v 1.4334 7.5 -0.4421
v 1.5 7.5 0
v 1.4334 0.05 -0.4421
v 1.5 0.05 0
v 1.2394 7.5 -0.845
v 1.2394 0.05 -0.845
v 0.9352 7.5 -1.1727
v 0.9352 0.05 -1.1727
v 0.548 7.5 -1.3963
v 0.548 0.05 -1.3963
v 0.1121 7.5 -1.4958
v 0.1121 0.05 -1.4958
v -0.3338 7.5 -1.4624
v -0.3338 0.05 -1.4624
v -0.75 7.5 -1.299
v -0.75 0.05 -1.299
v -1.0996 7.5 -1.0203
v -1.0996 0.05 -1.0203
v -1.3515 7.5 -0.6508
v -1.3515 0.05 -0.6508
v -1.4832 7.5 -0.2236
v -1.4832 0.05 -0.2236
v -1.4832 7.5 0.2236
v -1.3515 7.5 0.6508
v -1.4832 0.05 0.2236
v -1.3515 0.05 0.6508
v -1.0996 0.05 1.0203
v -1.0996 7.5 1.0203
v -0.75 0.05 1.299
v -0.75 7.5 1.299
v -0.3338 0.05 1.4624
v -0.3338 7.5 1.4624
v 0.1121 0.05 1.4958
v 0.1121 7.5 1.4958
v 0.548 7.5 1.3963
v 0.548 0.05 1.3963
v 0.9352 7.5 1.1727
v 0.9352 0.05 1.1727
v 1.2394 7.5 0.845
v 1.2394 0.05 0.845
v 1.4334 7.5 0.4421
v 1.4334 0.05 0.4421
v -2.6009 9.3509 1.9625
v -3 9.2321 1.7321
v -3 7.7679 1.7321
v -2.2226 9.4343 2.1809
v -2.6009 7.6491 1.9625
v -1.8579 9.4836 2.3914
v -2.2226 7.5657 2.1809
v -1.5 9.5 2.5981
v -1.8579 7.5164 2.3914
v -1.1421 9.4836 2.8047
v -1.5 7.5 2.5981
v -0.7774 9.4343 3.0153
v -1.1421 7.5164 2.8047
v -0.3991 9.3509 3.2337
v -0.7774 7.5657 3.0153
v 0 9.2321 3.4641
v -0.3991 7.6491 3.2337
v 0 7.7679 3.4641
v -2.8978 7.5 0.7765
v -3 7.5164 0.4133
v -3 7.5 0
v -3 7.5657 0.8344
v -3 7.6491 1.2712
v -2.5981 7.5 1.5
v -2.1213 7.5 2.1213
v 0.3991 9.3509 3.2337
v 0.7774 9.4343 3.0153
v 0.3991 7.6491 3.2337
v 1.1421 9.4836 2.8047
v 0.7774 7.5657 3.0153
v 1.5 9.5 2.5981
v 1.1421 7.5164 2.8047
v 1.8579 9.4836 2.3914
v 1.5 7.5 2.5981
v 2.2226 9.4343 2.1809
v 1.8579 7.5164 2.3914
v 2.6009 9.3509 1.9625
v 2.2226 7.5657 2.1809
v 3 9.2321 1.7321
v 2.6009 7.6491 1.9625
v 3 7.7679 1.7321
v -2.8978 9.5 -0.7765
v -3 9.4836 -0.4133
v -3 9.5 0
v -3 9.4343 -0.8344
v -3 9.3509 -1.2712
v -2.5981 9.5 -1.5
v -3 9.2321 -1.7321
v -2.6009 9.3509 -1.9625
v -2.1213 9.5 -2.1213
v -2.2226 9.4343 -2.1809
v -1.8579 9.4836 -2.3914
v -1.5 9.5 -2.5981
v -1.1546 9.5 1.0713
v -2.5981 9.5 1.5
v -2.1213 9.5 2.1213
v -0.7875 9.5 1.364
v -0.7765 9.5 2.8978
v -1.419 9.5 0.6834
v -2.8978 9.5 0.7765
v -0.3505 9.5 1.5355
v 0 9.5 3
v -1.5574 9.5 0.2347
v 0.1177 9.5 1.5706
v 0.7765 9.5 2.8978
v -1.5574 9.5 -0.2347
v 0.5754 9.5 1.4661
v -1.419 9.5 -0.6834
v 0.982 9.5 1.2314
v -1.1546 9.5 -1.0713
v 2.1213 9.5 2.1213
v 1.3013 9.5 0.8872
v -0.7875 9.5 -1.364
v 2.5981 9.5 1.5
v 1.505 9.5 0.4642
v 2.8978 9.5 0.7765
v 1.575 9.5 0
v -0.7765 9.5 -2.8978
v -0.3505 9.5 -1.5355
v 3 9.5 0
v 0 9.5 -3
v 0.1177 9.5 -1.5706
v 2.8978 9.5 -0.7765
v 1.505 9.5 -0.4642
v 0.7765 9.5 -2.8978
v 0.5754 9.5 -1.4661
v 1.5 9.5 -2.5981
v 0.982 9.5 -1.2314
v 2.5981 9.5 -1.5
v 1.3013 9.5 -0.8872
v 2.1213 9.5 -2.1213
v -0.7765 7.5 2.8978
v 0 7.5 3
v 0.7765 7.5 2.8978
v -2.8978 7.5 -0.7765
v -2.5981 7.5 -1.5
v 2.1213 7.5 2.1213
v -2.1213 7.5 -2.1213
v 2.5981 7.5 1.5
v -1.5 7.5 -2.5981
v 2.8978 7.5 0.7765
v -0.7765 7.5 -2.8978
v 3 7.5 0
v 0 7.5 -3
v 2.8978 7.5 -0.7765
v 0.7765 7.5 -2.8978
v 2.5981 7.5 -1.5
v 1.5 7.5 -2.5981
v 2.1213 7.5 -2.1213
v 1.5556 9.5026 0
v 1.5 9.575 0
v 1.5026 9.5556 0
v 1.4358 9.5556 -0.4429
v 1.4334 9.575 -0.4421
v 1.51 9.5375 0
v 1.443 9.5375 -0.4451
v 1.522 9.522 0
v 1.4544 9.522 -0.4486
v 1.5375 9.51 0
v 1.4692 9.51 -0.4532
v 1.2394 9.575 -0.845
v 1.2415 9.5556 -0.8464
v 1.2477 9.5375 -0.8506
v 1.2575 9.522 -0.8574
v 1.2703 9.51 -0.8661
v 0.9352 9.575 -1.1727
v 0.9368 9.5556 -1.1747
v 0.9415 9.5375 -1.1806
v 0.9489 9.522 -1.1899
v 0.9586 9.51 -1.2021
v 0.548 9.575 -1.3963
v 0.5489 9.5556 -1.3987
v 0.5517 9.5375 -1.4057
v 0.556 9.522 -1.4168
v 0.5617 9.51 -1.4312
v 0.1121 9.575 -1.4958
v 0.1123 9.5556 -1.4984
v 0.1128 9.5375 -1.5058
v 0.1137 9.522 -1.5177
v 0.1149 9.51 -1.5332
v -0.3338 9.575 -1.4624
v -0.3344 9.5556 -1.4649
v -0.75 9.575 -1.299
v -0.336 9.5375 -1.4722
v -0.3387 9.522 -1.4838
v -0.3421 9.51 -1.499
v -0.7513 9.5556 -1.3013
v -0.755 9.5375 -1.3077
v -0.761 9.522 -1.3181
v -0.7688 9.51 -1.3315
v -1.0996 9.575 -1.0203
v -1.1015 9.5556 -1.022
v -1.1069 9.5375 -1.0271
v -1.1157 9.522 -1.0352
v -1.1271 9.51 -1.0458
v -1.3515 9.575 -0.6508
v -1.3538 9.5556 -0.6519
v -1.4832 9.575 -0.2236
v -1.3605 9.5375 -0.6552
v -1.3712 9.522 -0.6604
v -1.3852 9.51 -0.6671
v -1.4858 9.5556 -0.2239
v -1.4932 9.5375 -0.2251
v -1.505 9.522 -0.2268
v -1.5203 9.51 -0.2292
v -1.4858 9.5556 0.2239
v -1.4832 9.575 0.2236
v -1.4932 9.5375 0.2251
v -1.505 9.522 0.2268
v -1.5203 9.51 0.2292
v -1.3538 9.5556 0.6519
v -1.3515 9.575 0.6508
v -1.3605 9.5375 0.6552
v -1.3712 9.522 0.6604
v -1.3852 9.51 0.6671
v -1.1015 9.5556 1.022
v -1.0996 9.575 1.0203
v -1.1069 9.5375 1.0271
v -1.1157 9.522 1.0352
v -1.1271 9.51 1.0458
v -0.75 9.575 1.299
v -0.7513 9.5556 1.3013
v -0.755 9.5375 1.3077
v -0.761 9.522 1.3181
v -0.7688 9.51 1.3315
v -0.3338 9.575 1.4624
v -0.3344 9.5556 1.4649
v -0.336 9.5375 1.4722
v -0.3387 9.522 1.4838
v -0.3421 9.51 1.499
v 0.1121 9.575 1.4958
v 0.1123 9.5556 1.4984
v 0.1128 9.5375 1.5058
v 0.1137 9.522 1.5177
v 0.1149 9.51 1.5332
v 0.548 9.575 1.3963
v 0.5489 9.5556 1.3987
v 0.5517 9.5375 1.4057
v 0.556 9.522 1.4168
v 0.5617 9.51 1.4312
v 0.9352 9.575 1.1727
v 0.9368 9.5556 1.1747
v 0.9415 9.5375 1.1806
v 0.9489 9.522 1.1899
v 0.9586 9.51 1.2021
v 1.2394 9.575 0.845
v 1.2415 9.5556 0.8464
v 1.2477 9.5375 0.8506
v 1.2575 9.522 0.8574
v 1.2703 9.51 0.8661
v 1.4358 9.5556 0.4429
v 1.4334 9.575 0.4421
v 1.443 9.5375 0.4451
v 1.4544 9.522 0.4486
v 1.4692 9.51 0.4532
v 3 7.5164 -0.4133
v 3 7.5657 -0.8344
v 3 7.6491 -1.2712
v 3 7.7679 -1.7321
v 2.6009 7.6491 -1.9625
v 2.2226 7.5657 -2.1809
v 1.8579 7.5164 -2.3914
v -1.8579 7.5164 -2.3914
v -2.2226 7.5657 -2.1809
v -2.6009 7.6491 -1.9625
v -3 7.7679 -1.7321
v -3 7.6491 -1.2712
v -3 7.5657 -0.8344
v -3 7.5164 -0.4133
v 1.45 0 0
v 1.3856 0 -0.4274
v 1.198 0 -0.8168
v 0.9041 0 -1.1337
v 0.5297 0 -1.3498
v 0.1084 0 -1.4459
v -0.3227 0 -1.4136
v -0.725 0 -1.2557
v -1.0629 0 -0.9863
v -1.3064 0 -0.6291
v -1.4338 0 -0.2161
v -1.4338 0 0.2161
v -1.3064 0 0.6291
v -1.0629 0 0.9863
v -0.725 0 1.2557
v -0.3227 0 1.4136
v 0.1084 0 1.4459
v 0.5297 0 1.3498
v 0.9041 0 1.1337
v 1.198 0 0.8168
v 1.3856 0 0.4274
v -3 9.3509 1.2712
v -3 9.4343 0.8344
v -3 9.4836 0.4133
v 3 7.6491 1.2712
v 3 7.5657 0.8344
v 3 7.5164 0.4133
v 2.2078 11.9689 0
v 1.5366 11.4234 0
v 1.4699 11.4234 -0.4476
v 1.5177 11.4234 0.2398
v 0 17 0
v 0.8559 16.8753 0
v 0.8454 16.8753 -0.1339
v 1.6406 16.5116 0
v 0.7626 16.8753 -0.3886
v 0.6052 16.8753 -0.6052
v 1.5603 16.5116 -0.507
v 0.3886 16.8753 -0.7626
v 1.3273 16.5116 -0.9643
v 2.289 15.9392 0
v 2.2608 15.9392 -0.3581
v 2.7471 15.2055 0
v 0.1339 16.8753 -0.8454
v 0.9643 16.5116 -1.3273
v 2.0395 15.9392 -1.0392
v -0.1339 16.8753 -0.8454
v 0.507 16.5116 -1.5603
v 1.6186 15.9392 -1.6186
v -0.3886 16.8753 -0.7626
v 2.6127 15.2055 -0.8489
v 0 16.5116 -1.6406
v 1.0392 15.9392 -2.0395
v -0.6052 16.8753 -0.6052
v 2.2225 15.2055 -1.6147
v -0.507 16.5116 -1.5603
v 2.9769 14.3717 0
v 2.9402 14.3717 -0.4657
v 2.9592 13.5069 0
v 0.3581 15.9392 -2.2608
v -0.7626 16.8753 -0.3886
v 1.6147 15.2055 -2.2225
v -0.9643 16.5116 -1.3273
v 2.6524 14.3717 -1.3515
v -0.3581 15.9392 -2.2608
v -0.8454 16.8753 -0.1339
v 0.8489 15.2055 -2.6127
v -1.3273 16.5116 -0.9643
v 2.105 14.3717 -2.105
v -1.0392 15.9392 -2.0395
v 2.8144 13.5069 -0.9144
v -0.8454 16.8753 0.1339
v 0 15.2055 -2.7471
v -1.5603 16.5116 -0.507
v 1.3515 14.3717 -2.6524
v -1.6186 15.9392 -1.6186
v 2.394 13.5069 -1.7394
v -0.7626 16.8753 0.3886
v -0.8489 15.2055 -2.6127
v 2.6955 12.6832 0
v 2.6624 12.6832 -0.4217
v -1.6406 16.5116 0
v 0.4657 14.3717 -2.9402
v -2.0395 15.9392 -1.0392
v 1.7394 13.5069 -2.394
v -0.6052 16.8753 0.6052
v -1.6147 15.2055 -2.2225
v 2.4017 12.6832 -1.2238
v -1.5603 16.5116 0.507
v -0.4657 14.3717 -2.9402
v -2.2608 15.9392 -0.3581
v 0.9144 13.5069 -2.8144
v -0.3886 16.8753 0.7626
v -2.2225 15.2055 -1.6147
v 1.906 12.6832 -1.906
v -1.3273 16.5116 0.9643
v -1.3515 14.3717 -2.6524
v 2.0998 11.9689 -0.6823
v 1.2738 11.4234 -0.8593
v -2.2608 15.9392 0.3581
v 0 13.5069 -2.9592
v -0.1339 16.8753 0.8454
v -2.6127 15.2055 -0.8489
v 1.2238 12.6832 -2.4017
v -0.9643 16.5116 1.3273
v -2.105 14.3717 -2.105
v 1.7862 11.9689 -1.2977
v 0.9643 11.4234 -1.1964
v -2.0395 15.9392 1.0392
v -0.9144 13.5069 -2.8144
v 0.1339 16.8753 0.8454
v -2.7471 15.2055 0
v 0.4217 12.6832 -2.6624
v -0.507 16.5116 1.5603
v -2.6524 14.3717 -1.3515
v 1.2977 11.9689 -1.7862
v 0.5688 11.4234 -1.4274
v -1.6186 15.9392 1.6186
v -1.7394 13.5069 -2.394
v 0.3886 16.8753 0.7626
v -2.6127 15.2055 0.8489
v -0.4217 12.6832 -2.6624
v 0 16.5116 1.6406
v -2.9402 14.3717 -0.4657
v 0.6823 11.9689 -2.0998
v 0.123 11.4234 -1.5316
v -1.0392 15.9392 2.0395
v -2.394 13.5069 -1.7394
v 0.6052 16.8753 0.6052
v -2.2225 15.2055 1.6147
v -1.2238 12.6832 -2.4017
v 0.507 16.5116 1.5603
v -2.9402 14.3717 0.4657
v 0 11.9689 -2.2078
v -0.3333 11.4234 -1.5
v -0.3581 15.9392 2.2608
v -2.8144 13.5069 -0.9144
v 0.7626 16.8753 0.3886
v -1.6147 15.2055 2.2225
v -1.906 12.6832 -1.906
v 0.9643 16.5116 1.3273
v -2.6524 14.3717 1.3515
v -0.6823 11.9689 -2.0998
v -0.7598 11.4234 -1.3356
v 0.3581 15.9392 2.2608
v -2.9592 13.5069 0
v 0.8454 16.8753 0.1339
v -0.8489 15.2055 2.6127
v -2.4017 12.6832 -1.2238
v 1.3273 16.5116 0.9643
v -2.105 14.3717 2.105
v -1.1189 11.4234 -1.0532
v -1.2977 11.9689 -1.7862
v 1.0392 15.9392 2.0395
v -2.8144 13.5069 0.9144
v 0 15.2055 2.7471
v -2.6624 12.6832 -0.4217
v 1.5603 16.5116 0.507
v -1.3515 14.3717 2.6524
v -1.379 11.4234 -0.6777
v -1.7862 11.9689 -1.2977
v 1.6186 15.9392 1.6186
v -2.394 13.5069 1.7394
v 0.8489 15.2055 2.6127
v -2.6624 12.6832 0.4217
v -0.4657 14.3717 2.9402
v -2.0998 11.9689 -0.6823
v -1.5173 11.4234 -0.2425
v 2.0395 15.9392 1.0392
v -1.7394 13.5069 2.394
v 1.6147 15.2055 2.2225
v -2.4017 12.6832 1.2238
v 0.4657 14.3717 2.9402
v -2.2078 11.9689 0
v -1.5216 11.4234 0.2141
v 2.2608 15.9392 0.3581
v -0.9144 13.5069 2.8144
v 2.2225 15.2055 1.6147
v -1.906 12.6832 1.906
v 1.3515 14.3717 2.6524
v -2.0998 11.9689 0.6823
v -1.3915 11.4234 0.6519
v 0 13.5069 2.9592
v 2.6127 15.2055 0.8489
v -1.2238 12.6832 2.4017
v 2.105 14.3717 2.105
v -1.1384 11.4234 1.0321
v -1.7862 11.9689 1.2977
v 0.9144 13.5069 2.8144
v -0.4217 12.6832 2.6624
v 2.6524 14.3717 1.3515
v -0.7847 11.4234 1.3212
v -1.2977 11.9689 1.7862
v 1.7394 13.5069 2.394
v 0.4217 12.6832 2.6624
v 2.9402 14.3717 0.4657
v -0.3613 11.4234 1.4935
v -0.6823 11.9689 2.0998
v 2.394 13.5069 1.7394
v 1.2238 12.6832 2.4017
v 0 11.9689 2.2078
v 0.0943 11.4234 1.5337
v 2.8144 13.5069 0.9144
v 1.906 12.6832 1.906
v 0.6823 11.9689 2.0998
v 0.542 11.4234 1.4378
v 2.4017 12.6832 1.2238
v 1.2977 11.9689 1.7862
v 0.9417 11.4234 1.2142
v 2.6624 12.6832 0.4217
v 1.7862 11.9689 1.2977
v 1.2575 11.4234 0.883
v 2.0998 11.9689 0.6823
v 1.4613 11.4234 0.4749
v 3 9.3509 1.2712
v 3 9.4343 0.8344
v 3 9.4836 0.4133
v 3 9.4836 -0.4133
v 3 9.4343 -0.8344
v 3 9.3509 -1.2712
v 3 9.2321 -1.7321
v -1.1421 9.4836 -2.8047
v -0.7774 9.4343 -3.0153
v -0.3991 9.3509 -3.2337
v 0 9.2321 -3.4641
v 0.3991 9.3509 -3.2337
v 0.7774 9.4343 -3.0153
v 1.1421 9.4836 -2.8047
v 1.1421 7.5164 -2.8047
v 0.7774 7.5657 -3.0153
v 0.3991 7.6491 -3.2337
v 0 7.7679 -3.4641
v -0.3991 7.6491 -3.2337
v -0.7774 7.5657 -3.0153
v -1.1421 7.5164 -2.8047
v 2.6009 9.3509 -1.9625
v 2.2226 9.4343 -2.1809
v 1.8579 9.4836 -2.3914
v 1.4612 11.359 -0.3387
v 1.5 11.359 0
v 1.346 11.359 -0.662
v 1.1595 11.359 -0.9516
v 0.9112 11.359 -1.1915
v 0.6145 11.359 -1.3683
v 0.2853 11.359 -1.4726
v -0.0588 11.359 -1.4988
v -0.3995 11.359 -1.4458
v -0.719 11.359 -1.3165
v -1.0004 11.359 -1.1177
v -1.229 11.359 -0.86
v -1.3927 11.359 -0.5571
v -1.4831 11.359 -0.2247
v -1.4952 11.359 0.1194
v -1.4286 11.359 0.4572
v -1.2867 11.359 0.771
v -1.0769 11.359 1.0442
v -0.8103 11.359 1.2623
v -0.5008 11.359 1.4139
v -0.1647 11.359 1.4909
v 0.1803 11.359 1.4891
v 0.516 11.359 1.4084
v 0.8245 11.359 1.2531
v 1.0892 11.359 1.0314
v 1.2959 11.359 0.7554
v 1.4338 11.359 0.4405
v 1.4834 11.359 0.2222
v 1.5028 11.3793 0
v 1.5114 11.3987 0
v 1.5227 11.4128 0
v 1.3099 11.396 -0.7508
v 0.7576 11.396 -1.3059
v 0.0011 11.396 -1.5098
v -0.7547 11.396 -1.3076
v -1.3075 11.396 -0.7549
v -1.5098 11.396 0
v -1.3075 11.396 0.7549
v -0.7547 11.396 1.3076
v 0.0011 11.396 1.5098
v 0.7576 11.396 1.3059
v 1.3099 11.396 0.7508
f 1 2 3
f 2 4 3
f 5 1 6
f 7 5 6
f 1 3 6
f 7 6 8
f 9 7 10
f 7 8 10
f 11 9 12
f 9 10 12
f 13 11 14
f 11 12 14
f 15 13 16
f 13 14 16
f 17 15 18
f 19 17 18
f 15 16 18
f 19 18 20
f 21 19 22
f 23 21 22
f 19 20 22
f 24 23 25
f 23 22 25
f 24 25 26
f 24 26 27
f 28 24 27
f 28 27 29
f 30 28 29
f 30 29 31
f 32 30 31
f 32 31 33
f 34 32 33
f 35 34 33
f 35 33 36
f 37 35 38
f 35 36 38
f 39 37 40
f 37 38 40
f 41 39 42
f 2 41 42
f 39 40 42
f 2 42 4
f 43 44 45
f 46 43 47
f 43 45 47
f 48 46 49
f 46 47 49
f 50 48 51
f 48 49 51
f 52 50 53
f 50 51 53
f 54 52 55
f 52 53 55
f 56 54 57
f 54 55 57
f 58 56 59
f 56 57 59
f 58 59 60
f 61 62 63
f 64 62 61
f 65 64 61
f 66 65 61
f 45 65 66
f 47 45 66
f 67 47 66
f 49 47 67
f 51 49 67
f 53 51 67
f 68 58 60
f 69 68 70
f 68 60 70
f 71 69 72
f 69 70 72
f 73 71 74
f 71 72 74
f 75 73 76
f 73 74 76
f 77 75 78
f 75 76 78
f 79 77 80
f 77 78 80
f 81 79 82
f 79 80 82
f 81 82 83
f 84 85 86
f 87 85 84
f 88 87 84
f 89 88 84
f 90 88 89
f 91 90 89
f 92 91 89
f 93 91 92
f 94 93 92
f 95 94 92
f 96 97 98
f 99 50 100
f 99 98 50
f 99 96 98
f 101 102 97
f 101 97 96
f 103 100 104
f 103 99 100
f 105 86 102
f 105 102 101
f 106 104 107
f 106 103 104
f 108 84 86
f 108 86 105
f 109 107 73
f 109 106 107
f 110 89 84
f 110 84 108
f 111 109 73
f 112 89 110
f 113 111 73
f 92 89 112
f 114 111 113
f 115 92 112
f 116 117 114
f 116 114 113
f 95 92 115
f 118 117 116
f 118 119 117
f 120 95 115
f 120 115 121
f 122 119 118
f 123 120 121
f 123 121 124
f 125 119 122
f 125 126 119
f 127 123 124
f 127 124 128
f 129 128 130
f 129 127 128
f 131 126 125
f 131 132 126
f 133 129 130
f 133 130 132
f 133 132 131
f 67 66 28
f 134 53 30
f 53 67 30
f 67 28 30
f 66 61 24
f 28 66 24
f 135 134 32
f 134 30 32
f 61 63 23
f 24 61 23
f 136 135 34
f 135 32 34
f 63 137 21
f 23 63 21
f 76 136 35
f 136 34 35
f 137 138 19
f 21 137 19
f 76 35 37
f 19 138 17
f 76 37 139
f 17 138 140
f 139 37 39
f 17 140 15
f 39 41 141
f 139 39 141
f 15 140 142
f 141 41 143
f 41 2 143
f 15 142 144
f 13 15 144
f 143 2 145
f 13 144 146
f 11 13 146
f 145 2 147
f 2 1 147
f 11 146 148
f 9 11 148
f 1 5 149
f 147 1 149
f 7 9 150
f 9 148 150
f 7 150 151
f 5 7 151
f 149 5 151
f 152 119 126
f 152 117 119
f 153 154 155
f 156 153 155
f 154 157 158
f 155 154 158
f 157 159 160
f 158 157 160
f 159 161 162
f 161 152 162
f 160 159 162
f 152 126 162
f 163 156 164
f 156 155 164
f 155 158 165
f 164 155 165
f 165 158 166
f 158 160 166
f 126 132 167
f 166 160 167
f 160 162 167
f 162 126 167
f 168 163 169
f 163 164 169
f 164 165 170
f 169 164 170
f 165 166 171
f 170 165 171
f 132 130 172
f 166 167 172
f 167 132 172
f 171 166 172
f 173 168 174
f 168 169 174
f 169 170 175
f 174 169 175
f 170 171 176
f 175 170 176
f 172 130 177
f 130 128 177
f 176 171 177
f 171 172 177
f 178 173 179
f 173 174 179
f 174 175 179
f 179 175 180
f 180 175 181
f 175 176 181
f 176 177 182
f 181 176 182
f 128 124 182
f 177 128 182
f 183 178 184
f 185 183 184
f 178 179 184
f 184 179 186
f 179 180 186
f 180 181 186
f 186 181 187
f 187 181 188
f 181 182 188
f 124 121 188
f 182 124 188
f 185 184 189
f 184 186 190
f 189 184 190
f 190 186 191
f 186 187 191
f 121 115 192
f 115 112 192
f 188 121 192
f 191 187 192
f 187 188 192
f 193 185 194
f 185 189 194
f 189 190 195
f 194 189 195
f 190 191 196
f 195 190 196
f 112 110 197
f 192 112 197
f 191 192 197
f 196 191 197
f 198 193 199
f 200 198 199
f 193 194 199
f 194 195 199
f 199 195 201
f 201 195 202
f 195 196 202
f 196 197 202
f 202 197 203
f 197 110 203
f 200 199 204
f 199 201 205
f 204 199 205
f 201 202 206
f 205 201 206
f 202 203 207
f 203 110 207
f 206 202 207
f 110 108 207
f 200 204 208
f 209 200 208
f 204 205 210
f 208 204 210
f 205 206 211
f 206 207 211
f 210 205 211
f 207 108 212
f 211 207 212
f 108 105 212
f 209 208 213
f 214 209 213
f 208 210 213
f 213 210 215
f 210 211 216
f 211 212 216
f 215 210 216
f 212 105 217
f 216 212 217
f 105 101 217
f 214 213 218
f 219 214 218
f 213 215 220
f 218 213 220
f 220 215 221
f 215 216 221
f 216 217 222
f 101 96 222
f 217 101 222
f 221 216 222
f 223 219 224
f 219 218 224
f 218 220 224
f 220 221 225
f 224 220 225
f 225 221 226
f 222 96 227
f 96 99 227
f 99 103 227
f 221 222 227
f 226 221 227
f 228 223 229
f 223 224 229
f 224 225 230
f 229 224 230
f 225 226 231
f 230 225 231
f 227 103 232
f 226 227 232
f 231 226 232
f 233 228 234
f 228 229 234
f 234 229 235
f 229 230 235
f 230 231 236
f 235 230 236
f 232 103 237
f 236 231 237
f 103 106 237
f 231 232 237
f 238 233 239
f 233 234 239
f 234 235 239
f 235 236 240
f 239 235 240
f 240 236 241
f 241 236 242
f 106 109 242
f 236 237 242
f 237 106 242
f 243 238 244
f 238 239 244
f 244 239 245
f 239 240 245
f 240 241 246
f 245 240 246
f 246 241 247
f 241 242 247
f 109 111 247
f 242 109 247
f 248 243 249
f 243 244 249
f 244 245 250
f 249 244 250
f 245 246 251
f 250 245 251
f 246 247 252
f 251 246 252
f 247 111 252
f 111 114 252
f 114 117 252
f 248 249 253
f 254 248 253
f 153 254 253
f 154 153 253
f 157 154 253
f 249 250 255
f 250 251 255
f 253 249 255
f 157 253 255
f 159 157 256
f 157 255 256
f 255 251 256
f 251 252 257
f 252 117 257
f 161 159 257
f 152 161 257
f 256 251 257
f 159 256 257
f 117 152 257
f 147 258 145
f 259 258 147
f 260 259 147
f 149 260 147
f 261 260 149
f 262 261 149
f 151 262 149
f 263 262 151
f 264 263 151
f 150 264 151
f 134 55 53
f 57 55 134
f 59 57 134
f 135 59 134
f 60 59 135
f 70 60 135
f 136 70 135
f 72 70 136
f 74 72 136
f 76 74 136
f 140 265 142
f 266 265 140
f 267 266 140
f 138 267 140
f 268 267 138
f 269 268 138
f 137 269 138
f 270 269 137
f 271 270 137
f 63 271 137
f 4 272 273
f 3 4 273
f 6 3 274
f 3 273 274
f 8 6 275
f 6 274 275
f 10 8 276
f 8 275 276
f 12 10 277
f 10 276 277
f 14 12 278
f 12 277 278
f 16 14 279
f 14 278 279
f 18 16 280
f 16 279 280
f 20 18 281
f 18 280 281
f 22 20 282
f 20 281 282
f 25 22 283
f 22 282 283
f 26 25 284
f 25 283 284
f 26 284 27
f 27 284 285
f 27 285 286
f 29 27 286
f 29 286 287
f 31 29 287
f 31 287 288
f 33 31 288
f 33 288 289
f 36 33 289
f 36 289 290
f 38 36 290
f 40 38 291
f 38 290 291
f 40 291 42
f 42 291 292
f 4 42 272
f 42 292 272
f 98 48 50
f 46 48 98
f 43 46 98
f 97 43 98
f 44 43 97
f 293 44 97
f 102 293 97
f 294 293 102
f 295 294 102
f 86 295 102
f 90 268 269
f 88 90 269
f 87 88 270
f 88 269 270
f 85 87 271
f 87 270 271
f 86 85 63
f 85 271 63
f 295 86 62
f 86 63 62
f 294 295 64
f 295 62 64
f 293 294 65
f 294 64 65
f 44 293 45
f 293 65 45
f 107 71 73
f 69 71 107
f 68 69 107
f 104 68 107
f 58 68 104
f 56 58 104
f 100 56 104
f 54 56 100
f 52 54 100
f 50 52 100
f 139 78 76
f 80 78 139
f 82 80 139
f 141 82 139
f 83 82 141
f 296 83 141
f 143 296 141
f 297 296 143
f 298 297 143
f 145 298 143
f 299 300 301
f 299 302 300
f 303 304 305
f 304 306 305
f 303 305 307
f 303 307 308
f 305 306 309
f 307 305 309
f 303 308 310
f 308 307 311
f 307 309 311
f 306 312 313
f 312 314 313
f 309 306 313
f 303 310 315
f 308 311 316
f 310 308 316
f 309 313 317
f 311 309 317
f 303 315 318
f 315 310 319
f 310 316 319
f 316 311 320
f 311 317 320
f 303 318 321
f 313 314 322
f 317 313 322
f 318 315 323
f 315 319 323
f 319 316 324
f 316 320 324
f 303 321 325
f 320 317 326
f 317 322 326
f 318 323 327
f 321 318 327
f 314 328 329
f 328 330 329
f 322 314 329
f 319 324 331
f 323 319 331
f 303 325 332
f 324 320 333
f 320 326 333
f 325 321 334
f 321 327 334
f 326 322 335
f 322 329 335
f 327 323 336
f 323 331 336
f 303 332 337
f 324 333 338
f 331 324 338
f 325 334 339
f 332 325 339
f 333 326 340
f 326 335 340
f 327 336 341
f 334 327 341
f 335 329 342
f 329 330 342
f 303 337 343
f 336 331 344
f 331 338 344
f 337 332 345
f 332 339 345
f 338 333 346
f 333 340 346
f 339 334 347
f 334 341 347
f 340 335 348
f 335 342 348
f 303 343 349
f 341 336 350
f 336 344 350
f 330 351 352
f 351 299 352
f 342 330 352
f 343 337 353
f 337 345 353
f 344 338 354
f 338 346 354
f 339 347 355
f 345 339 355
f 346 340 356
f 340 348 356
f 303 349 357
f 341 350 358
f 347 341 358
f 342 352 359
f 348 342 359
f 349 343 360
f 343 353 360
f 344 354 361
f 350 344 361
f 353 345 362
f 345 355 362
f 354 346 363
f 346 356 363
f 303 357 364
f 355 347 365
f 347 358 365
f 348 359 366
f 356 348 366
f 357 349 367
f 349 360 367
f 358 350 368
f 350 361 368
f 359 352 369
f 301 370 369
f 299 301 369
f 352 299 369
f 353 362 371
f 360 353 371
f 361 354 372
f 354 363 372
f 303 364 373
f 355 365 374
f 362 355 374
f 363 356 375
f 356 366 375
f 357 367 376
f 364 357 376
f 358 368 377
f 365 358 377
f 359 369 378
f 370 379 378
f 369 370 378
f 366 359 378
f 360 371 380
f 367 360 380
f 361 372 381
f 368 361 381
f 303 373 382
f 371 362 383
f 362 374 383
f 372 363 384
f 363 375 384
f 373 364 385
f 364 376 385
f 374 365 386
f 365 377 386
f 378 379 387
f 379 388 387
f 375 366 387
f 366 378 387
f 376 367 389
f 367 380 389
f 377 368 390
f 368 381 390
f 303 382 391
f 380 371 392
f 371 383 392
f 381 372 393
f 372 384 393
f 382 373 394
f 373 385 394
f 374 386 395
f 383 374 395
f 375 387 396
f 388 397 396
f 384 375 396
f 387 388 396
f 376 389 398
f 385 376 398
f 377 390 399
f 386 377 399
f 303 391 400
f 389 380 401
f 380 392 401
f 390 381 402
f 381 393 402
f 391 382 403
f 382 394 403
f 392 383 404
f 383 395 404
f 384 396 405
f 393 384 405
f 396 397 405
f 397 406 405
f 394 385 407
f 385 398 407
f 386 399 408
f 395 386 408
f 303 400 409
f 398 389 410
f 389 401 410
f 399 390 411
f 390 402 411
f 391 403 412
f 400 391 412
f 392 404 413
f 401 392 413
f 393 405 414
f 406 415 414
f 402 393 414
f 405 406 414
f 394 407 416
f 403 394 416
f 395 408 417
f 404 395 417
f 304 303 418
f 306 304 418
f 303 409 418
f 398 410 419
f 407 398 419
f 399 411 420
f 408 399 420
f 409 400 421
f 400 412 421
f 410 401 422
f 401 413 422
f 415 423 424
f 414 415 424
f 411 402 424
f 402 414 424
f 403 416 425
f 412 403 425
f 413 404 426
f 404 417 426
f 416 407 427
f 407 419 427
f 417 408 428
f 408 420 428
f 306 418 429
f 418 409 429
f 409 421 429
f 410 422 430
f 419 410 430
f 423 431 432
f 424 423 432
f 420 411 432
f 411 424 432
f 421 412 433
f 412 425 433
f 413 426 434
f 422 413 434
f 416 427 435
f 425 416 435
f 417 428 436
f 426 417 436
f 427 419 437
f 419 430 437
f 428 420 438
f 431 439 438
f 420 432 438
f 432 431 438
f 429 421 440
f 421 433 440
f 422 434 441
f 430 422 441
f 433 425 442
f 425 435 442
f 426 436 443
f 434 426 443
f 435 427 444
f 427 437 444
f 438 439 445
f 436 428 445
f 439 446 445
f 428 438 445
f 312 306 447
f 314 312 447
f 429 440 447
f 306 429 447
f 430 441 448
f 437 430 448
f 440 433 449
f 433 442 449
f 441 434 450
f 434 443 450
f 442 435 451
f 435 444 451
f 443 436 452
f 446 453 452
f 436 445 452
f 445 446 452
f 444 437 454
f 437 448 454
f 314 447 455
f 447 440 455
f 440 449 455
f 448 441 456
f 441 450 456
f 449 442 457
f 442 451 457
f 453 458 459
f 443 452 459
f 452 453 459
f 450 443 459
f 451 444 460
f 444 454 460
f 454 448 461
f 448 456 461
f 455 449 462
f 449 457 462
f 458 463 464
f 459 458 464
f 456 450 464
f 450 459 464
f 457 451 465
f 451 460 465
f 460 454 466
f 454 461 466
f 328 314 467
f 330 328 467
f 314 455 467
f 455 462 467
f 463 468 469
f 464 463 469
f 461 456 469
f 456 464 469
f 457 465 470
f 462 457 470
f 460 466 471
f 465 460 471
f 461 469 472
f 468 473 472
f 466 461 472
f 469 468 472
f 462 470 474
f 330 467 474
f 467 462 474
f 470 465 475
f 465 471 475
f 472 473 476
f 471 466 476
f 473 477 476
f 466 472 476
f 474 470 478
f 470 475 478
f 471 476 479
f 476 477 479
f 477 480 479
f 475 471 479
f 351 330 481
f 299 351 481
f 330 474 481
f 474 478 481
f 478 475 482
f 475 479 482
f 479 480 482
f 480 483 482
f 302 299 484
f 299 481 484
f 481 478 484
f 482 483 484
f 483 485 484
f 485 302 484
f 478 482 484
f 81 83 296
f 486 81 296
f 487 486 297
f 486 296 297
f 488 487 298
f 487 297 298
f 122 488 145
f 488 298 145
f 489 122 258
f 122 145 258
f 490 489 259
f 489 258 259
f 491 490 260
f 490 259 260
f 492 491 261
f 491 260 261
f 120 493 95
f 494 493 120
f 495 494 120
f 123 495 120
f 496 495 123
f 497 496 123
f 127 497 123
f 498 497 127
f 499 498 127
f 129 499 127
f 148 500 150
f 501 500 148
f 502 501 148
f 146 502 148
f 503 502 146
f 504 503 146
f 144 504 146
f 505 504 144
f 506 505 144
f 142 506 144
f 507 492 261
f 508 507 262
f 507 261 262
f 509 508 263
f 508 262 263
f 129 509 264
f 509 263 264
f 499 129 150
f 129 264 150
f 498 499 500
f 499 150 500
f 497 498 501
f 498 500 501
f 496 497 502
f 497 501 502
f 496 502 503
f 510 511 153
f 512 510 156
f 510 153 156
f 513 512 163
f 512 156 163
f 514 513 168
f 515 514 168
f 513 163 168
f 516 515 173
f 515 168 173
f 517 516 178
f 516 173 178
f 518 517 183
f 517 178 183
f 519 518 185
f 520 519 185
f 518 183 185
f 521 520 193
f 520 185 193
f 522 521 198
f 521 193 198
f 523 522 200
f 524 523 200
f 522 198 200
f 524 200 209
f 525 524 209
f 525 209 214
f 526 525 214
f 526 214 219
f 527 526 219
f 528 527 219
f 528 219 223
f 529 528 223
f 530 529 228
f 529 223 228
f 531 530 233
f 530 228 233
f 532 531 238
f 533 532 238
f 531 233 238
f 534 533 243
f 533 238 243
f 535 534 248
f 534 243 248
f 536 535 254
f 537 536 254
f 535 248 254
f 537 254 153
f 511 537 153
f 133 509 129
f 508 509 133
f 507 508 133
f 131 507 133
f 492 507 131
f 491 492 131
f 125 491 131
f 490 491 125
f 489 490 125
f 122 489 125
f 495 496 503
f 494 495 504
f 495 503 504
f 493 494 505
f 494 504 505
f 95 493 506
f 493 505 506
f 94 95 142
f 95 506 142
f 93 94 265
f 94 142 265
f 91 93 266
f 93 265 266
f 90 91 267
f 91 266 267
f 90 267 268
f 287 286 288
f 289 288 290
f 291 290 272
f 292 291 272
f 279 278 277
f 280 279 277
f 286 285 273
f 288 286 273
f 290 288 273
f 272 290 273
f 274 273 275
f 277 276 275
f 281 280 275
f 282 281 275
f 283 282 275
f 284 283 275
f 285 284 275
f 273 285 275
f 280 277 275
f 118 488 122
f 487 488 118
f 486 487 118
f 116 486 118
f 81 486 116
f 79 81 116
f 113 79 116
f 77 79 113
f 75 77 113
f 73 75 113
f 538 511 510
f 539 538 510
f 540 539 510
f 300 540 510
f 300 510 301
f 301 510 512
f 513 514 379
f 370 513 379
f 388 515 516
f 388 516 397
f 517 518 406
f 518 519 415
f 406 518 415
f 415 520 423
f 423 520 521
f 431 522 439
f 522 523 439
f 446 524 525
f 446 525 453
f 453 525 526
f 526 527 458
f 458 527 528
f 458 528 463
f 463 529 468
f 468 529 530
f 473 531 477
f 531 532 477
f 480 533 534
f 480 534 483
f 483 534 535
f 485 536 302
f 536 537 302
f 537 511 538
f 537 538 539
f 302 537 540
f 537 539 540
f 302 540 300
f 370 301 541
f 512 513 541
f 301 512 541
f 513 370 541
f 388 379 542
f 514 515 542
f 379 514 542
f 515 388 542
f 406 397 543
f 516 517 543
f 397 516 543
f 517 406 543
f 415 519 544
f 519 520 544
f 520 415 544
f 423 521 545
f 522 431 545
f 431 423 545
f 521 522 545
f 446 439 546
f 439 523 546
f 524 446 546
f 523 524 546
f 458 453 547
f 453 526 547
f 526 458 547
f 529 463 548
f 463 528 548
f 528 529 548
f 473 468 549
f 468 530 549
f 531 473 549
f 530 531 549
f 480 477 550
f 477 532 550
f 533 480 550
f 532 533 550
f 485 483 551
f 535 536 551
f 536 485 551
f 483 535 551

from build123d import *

# Parameters (mm, degrees)
CHAMFER1_SIZE       = 0.05
SKETCH4_R           = 1.5
BOSS_EXTRUDE2_DEPTH = 2
SKETCH5_OUTSIDE_W   = 18.79
SKETCH5_OUTSIDE_H   = 19.718
SKETCH5_OUTSIDE_R   = 3
CUT_EXTRUDE1_DEPTH  = 2
CUT_EXTRUDE1_TAPER  = 60
SKETCH6_OUTSIDE_W   = 18.79
SKETCH6_OUTSIDE_H   = 19.718
SKETCH6_OUTSIDE_R   = 3
CUT_EXTRUDE2_DEPTH  = 2
CUT_EXTRUDE2_TAPER  = 60
FILLET1_R           = 0.075


with BuildPart() as part:
    # Sketch1 → Revolve2 (revolve)
    with BuildSketch(Plane.XY):
        with BuildLine():
            Line((0, 0), (0, 11))
            Line((0, 11), (0, 17))
            ThreePointArc((0, 17), (2.897777479, 14.776457135), (1.5, 11.401923789))
            Line((1.5, 11.401923789), (1.5, 0))
            Line((1.5, 0), (0, 0))
        make_face()
    revolve(axis=Axis((0, 0, 0), (0, 1, 0)))

    # Chamfer1
    chamfer1_edges = [part.edges().sort_by_distance(p)[0] for p in [
        (-1.5, 0, 0),
    ]]
    chamfer(chamfer1_edges, length=CHAMFER1_SIZE)

    # Sketch4 → Boss-Extrude2 (add)
    with BuildSketch(Plane(origin=(0, 7.5, 0), x_dir=(1, 0, 0), z_dir=(0, 1, 0))):
        Polygon((0, -3.464101615), (3, -1.732050808), (3, 1.732050808), (0, 3.464101615), (-3, 1.732050808), (-3, -1.732050808), align=None)
        Circle(SKETCH4_R, mode=Mode.SUBTRACT)
    extrude(amount=BOSS_EXTRUDE2_DEPTH)

    # Sketch5 outside → Cut-Extrude1 (cut)
    with BuildSketch(Plane.XZ.offset(-7.5)):
        Rectangle(SKETCH5_OUTSIDE_W, SKETCH5_OUTSIDE_H)
        Circle(SKETCH5_OUTSIDE_R, mode=Mode.SUBTRACT)
    extrude(amount=-CUT_EXTRUDE1_DEPTH, taper=CUT_EXTRUDE1_TAPER, mode=Mode.SUBTRACT)

    # Sketch6 outside → Cut-Extrude2 (cut)
    with BuildSketch(Plane(origin=(0, 9.5, 0), x_dir=(1, 0, 0), z_dir=(0, 1, 0))):
        Rectangle(SKETCH6_OUTSIDE_W, SKETCH6_OUTSIDE_H)
        Circle(SKETCH6_OUTSIDE_R, mode=Mode.SUBTRACT)
    extrude(amount=-CUT_EXTRUDE2_DEPTH, taper=CUT_EXTRUDE2_TAPER, mode=Mode.SUBTRACT)

    # Fillet1
    fillet1_edges = [part.edges().sort_by_distance(p)[0] for p in [
        (-1.5, 9.5, 0),
        (-1.5, 11.401923789, 0),
    ]]
    fillet(fillet1_edges, radius=FILLET1_R)


solid = part.part
